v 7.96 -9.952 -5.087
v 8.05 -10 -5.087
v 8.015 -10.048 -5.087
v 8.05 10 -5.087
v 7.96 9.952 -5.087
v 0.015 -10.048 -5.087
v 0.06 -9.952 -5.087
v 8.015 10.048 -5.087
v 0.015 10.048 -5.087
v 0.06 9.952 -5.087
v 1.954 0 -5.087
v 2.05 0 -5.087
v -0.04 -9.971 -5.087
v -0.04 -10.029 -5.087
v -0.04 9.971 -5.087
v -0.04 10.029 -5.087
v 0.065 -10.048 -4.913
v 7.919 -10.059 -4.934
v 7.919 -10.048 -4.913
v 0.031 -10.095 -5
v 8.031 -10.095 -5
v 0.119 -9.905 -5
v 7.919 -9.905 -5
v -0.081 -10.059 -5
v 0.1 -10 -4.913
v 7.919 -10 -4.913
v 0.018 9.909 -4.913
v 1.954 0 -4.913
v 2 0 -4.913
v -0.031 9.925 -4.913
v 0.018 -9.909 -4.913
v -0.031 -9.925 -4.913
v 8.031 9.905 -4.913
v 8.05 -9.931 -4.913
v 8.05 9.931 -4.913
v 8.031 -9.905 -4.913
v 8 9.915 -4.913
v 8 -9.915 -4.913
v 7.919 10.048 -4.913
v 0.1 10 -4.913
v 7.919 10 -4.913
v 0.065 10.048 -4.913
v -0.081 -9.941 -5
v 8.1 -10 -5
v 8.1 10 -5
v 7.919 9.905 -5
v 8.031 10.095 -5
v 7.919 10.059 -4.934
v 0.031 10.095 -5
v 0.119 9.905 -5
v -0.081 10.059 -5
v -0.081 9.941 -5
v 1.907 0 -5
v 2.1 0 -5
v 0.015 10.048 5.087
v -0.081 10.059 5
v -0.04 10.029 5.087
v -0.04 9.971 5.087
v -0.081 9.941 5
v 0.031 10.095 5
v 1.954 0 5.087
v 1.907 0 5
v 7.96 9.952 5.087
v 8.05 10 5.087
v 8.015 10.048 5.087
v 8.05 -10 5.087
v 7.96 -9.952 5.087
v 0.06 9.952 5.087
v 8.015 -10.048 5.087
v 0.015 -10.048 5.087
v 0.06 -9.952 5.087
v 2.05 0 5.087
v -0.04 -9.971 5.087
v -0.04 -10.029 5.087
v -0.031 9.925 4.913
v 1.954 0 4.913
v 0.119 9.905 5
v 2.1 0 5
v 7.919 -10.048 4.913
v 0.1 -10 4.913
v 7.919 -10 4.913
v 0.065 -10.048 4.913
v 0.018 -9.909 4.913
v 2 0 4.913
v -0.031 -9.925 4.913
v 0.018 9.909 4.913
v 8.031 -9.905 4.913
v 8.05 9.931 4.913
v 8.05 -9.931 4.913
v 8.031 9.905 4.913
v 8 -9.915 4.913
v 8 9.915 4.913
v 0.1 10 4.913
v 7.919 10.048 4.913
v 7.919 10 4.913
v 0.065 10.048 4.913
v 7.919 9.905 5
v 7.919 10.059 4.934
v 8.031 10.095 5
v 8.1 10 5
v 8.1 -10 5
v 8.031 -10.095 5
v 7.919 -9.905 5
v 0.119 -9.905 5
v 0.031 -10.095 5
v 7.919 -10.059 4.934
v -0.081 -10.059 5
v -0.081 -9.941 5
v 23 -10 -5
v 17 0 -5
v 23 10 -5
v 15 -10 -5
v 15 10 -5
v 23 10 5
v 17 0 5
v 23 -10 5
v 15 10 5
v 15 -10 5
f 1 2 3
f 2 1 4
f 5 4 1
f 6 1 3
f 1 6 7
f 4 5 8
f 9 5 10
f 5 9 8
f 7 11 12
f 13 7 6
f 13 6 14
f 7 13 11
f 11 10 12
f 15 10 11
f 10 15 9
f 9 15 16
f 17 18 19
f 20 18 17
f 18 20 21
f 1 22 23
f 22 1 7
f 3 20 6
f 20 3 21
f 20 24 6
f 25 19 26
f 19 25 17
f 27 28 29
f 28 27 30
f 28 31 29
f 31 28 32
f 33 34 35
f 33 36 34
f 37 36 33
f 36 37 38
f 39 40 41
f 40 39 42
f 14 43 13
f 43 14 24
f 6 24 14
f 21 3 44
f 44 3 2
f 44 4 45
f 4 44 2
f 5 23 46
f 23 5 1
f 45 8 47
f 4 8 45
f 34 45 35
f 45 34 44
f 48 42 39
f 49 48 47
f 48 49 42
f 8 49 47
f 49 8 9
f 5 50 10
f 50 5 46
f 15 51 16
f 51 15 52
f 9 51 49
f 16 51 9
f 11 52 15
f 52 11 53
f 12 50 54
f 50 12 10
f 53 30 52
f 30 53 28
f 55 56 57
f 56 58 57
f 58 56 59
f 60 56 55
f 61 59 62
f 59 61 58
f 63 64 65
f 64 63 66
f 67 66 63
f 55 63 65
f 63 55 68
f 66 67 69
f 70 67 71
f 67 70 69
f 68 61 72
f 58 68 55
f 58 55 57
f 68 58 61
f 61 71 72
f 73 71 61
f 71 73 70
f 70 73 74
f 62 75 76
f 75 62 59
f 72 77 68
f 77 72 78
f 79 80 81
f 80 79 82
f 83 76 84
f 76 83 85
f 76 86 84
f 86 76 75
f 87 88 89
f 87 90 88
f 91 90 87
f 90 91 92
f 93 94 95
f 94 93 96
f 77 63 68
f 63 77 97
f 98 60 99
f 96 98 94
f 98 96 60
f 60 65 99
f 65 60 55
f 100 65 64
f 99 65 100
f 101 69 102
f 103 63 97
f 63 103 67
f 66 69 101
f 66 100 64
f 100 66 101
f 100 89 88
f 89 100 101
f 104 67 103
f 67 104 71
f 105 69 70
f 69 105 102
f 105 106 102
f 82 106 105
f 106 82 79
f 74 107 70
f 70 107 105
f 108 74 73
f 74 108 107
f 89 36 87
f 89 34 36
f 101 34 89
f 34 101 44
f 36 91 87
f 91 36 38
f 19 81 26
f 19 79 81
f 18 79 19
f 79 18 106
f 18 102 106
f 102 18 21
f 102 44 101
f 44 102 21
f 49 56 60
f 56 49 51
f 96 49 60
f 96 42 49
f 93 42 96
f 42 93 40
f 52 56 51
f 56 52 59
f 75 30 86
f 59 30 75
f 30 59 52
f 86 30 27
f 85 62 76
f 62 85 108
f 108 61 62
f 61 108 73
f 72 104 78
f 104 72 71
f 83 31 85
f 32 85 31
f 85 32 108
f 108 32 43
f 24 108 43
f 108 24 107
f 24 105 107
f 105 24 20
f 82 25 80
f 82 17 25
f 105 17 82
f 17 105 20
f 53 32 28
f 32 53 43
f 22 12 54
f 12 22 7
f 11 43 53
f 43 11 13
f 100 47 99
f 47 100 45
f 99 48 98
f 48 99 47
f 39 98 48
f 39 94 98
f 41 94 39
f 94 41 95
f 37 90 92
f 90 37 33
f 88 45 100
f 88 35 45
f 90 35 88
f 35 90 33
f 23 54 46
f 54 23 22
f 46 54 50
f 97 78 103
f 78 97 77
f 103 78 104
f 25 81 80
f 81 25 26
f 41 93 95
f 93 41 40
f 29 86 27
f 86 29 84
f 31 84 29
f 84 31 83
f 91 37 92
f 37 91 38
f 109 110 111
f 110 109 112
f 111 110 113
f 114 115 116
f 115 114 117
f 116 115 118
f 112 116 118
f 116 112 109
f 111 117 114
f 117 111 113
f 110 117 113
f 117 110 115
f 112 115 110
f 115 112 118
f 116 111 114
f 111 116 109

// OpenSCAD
// Join Points.

Show_Rendering_Error=true;

module join_points(points,faces,r=0.1,debug=false) {
    if(debug) {
        echo("join_points:");
        echo(str("  points: ",points));
        echo(str("   faces: ",faces));
    }
    for(i=[0:len(faces)-1]) {
        face=faces[i];
            if(debug) {
                echo("  face ",i,": ",face);
            }
            for(j=[0:len(face)-2]) {
                color([j/len(face),j/len(face),j/len(face)]) hull() {
                    translate(points[face[j]]) sphere(r=r);
                    translate(points[face[j+1]]) sphere(r=r);
                }
            }
            color([1,1,1]) hull() {
                translate(points[face[len(face)-1]]) sphere(r=r);
                translate(points[face[0]]) sphere(r=r);
            }
    }
}

// If set to false, draws 1 polyhedron, renders OK, imports to MeshLab OK.
// If set to true, draws 2 identical polyhedra, on render:
//     "WARNING: Object may not be a valid 2-manifold and may need repair!"
Show_Rendering_Error=true;

p=[[0,-10,-5],[2,-10,-5],[8,-10,-5],[8,10,-5],[2,10,-5],[0,10,-5],[2,0,-5],
  [0,-10,5], [2,-10,5], [8,-10,5], [8,10,5], [2,10,5], [0,10,5], [2,0,5]];

/* f=[[8,7,13],[13,12,11],[9,8,10],[8,11,10],
  [6,0,1],[4,5,6],[3,1,2],[3,4,1],
  [7,8,1],[8,9,2],[9,10,3],[10,11,4],[11,12,5],[12,13,6],[13,7,0],
  [1,0,7],[2,1,8],[3,2,9],[4,3,10],[5,4,11],[6,5,12],[0,6,13]];
*/
f=[ [0,1,2,3,4,5,6]
    ,[13,12,11,10,9,8,7]
    ,[7,8,9,2,1,0]
    ,[10,11,12,5,4,3]
    //,[12,13,6,5]
    //,[13,7,0,6]
    ,[12,13,7,0,6,5]
    ,[9,10,3,2]
];

//polyhedron(points=p,faces=f);
//if (Show_Rendering_Error) translate([15,0,0]) polyhedron(points=p,faces=f);
join_points(points=p,faces=f,r=0.1,debug=true);
polyhedron(points=p,faces=f);

if (Show_Rendering_Error) translate([15,0,0]) polyhedron(points=p,faces=f);
